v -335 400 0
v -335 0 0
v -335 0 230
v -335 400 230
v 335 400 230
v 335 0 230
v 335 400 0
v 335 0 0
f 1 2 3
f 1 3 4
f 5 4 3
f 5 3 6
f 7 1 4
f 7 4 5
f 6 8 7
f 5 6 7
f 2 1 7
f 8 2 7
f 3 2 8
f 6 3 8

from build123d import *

# Parameters (mm, degrees)
F0_W     = 670
F0_H     = 400
F1_DEPTH = 230
F2_DEPTH = 230


with BuildPart() as f1:
    # F0 (on Top) → F1 (new body)
    with BuildSketch(Plane.XY):
        with Locations((0, 200)):
            Rectangle(F0_W, F0_H)
    extrude(amount=F1_DEPTH)


with BuildPart() as f2:
    # F0 (on Top) → F2 (new body)
    with BuildSketch(Plane.XY):
        with Locations((0, 200)):
            Rectangle(F0_W, F0_H)
    extrude(amount=F2_DEPTH)


solid = f1.part
